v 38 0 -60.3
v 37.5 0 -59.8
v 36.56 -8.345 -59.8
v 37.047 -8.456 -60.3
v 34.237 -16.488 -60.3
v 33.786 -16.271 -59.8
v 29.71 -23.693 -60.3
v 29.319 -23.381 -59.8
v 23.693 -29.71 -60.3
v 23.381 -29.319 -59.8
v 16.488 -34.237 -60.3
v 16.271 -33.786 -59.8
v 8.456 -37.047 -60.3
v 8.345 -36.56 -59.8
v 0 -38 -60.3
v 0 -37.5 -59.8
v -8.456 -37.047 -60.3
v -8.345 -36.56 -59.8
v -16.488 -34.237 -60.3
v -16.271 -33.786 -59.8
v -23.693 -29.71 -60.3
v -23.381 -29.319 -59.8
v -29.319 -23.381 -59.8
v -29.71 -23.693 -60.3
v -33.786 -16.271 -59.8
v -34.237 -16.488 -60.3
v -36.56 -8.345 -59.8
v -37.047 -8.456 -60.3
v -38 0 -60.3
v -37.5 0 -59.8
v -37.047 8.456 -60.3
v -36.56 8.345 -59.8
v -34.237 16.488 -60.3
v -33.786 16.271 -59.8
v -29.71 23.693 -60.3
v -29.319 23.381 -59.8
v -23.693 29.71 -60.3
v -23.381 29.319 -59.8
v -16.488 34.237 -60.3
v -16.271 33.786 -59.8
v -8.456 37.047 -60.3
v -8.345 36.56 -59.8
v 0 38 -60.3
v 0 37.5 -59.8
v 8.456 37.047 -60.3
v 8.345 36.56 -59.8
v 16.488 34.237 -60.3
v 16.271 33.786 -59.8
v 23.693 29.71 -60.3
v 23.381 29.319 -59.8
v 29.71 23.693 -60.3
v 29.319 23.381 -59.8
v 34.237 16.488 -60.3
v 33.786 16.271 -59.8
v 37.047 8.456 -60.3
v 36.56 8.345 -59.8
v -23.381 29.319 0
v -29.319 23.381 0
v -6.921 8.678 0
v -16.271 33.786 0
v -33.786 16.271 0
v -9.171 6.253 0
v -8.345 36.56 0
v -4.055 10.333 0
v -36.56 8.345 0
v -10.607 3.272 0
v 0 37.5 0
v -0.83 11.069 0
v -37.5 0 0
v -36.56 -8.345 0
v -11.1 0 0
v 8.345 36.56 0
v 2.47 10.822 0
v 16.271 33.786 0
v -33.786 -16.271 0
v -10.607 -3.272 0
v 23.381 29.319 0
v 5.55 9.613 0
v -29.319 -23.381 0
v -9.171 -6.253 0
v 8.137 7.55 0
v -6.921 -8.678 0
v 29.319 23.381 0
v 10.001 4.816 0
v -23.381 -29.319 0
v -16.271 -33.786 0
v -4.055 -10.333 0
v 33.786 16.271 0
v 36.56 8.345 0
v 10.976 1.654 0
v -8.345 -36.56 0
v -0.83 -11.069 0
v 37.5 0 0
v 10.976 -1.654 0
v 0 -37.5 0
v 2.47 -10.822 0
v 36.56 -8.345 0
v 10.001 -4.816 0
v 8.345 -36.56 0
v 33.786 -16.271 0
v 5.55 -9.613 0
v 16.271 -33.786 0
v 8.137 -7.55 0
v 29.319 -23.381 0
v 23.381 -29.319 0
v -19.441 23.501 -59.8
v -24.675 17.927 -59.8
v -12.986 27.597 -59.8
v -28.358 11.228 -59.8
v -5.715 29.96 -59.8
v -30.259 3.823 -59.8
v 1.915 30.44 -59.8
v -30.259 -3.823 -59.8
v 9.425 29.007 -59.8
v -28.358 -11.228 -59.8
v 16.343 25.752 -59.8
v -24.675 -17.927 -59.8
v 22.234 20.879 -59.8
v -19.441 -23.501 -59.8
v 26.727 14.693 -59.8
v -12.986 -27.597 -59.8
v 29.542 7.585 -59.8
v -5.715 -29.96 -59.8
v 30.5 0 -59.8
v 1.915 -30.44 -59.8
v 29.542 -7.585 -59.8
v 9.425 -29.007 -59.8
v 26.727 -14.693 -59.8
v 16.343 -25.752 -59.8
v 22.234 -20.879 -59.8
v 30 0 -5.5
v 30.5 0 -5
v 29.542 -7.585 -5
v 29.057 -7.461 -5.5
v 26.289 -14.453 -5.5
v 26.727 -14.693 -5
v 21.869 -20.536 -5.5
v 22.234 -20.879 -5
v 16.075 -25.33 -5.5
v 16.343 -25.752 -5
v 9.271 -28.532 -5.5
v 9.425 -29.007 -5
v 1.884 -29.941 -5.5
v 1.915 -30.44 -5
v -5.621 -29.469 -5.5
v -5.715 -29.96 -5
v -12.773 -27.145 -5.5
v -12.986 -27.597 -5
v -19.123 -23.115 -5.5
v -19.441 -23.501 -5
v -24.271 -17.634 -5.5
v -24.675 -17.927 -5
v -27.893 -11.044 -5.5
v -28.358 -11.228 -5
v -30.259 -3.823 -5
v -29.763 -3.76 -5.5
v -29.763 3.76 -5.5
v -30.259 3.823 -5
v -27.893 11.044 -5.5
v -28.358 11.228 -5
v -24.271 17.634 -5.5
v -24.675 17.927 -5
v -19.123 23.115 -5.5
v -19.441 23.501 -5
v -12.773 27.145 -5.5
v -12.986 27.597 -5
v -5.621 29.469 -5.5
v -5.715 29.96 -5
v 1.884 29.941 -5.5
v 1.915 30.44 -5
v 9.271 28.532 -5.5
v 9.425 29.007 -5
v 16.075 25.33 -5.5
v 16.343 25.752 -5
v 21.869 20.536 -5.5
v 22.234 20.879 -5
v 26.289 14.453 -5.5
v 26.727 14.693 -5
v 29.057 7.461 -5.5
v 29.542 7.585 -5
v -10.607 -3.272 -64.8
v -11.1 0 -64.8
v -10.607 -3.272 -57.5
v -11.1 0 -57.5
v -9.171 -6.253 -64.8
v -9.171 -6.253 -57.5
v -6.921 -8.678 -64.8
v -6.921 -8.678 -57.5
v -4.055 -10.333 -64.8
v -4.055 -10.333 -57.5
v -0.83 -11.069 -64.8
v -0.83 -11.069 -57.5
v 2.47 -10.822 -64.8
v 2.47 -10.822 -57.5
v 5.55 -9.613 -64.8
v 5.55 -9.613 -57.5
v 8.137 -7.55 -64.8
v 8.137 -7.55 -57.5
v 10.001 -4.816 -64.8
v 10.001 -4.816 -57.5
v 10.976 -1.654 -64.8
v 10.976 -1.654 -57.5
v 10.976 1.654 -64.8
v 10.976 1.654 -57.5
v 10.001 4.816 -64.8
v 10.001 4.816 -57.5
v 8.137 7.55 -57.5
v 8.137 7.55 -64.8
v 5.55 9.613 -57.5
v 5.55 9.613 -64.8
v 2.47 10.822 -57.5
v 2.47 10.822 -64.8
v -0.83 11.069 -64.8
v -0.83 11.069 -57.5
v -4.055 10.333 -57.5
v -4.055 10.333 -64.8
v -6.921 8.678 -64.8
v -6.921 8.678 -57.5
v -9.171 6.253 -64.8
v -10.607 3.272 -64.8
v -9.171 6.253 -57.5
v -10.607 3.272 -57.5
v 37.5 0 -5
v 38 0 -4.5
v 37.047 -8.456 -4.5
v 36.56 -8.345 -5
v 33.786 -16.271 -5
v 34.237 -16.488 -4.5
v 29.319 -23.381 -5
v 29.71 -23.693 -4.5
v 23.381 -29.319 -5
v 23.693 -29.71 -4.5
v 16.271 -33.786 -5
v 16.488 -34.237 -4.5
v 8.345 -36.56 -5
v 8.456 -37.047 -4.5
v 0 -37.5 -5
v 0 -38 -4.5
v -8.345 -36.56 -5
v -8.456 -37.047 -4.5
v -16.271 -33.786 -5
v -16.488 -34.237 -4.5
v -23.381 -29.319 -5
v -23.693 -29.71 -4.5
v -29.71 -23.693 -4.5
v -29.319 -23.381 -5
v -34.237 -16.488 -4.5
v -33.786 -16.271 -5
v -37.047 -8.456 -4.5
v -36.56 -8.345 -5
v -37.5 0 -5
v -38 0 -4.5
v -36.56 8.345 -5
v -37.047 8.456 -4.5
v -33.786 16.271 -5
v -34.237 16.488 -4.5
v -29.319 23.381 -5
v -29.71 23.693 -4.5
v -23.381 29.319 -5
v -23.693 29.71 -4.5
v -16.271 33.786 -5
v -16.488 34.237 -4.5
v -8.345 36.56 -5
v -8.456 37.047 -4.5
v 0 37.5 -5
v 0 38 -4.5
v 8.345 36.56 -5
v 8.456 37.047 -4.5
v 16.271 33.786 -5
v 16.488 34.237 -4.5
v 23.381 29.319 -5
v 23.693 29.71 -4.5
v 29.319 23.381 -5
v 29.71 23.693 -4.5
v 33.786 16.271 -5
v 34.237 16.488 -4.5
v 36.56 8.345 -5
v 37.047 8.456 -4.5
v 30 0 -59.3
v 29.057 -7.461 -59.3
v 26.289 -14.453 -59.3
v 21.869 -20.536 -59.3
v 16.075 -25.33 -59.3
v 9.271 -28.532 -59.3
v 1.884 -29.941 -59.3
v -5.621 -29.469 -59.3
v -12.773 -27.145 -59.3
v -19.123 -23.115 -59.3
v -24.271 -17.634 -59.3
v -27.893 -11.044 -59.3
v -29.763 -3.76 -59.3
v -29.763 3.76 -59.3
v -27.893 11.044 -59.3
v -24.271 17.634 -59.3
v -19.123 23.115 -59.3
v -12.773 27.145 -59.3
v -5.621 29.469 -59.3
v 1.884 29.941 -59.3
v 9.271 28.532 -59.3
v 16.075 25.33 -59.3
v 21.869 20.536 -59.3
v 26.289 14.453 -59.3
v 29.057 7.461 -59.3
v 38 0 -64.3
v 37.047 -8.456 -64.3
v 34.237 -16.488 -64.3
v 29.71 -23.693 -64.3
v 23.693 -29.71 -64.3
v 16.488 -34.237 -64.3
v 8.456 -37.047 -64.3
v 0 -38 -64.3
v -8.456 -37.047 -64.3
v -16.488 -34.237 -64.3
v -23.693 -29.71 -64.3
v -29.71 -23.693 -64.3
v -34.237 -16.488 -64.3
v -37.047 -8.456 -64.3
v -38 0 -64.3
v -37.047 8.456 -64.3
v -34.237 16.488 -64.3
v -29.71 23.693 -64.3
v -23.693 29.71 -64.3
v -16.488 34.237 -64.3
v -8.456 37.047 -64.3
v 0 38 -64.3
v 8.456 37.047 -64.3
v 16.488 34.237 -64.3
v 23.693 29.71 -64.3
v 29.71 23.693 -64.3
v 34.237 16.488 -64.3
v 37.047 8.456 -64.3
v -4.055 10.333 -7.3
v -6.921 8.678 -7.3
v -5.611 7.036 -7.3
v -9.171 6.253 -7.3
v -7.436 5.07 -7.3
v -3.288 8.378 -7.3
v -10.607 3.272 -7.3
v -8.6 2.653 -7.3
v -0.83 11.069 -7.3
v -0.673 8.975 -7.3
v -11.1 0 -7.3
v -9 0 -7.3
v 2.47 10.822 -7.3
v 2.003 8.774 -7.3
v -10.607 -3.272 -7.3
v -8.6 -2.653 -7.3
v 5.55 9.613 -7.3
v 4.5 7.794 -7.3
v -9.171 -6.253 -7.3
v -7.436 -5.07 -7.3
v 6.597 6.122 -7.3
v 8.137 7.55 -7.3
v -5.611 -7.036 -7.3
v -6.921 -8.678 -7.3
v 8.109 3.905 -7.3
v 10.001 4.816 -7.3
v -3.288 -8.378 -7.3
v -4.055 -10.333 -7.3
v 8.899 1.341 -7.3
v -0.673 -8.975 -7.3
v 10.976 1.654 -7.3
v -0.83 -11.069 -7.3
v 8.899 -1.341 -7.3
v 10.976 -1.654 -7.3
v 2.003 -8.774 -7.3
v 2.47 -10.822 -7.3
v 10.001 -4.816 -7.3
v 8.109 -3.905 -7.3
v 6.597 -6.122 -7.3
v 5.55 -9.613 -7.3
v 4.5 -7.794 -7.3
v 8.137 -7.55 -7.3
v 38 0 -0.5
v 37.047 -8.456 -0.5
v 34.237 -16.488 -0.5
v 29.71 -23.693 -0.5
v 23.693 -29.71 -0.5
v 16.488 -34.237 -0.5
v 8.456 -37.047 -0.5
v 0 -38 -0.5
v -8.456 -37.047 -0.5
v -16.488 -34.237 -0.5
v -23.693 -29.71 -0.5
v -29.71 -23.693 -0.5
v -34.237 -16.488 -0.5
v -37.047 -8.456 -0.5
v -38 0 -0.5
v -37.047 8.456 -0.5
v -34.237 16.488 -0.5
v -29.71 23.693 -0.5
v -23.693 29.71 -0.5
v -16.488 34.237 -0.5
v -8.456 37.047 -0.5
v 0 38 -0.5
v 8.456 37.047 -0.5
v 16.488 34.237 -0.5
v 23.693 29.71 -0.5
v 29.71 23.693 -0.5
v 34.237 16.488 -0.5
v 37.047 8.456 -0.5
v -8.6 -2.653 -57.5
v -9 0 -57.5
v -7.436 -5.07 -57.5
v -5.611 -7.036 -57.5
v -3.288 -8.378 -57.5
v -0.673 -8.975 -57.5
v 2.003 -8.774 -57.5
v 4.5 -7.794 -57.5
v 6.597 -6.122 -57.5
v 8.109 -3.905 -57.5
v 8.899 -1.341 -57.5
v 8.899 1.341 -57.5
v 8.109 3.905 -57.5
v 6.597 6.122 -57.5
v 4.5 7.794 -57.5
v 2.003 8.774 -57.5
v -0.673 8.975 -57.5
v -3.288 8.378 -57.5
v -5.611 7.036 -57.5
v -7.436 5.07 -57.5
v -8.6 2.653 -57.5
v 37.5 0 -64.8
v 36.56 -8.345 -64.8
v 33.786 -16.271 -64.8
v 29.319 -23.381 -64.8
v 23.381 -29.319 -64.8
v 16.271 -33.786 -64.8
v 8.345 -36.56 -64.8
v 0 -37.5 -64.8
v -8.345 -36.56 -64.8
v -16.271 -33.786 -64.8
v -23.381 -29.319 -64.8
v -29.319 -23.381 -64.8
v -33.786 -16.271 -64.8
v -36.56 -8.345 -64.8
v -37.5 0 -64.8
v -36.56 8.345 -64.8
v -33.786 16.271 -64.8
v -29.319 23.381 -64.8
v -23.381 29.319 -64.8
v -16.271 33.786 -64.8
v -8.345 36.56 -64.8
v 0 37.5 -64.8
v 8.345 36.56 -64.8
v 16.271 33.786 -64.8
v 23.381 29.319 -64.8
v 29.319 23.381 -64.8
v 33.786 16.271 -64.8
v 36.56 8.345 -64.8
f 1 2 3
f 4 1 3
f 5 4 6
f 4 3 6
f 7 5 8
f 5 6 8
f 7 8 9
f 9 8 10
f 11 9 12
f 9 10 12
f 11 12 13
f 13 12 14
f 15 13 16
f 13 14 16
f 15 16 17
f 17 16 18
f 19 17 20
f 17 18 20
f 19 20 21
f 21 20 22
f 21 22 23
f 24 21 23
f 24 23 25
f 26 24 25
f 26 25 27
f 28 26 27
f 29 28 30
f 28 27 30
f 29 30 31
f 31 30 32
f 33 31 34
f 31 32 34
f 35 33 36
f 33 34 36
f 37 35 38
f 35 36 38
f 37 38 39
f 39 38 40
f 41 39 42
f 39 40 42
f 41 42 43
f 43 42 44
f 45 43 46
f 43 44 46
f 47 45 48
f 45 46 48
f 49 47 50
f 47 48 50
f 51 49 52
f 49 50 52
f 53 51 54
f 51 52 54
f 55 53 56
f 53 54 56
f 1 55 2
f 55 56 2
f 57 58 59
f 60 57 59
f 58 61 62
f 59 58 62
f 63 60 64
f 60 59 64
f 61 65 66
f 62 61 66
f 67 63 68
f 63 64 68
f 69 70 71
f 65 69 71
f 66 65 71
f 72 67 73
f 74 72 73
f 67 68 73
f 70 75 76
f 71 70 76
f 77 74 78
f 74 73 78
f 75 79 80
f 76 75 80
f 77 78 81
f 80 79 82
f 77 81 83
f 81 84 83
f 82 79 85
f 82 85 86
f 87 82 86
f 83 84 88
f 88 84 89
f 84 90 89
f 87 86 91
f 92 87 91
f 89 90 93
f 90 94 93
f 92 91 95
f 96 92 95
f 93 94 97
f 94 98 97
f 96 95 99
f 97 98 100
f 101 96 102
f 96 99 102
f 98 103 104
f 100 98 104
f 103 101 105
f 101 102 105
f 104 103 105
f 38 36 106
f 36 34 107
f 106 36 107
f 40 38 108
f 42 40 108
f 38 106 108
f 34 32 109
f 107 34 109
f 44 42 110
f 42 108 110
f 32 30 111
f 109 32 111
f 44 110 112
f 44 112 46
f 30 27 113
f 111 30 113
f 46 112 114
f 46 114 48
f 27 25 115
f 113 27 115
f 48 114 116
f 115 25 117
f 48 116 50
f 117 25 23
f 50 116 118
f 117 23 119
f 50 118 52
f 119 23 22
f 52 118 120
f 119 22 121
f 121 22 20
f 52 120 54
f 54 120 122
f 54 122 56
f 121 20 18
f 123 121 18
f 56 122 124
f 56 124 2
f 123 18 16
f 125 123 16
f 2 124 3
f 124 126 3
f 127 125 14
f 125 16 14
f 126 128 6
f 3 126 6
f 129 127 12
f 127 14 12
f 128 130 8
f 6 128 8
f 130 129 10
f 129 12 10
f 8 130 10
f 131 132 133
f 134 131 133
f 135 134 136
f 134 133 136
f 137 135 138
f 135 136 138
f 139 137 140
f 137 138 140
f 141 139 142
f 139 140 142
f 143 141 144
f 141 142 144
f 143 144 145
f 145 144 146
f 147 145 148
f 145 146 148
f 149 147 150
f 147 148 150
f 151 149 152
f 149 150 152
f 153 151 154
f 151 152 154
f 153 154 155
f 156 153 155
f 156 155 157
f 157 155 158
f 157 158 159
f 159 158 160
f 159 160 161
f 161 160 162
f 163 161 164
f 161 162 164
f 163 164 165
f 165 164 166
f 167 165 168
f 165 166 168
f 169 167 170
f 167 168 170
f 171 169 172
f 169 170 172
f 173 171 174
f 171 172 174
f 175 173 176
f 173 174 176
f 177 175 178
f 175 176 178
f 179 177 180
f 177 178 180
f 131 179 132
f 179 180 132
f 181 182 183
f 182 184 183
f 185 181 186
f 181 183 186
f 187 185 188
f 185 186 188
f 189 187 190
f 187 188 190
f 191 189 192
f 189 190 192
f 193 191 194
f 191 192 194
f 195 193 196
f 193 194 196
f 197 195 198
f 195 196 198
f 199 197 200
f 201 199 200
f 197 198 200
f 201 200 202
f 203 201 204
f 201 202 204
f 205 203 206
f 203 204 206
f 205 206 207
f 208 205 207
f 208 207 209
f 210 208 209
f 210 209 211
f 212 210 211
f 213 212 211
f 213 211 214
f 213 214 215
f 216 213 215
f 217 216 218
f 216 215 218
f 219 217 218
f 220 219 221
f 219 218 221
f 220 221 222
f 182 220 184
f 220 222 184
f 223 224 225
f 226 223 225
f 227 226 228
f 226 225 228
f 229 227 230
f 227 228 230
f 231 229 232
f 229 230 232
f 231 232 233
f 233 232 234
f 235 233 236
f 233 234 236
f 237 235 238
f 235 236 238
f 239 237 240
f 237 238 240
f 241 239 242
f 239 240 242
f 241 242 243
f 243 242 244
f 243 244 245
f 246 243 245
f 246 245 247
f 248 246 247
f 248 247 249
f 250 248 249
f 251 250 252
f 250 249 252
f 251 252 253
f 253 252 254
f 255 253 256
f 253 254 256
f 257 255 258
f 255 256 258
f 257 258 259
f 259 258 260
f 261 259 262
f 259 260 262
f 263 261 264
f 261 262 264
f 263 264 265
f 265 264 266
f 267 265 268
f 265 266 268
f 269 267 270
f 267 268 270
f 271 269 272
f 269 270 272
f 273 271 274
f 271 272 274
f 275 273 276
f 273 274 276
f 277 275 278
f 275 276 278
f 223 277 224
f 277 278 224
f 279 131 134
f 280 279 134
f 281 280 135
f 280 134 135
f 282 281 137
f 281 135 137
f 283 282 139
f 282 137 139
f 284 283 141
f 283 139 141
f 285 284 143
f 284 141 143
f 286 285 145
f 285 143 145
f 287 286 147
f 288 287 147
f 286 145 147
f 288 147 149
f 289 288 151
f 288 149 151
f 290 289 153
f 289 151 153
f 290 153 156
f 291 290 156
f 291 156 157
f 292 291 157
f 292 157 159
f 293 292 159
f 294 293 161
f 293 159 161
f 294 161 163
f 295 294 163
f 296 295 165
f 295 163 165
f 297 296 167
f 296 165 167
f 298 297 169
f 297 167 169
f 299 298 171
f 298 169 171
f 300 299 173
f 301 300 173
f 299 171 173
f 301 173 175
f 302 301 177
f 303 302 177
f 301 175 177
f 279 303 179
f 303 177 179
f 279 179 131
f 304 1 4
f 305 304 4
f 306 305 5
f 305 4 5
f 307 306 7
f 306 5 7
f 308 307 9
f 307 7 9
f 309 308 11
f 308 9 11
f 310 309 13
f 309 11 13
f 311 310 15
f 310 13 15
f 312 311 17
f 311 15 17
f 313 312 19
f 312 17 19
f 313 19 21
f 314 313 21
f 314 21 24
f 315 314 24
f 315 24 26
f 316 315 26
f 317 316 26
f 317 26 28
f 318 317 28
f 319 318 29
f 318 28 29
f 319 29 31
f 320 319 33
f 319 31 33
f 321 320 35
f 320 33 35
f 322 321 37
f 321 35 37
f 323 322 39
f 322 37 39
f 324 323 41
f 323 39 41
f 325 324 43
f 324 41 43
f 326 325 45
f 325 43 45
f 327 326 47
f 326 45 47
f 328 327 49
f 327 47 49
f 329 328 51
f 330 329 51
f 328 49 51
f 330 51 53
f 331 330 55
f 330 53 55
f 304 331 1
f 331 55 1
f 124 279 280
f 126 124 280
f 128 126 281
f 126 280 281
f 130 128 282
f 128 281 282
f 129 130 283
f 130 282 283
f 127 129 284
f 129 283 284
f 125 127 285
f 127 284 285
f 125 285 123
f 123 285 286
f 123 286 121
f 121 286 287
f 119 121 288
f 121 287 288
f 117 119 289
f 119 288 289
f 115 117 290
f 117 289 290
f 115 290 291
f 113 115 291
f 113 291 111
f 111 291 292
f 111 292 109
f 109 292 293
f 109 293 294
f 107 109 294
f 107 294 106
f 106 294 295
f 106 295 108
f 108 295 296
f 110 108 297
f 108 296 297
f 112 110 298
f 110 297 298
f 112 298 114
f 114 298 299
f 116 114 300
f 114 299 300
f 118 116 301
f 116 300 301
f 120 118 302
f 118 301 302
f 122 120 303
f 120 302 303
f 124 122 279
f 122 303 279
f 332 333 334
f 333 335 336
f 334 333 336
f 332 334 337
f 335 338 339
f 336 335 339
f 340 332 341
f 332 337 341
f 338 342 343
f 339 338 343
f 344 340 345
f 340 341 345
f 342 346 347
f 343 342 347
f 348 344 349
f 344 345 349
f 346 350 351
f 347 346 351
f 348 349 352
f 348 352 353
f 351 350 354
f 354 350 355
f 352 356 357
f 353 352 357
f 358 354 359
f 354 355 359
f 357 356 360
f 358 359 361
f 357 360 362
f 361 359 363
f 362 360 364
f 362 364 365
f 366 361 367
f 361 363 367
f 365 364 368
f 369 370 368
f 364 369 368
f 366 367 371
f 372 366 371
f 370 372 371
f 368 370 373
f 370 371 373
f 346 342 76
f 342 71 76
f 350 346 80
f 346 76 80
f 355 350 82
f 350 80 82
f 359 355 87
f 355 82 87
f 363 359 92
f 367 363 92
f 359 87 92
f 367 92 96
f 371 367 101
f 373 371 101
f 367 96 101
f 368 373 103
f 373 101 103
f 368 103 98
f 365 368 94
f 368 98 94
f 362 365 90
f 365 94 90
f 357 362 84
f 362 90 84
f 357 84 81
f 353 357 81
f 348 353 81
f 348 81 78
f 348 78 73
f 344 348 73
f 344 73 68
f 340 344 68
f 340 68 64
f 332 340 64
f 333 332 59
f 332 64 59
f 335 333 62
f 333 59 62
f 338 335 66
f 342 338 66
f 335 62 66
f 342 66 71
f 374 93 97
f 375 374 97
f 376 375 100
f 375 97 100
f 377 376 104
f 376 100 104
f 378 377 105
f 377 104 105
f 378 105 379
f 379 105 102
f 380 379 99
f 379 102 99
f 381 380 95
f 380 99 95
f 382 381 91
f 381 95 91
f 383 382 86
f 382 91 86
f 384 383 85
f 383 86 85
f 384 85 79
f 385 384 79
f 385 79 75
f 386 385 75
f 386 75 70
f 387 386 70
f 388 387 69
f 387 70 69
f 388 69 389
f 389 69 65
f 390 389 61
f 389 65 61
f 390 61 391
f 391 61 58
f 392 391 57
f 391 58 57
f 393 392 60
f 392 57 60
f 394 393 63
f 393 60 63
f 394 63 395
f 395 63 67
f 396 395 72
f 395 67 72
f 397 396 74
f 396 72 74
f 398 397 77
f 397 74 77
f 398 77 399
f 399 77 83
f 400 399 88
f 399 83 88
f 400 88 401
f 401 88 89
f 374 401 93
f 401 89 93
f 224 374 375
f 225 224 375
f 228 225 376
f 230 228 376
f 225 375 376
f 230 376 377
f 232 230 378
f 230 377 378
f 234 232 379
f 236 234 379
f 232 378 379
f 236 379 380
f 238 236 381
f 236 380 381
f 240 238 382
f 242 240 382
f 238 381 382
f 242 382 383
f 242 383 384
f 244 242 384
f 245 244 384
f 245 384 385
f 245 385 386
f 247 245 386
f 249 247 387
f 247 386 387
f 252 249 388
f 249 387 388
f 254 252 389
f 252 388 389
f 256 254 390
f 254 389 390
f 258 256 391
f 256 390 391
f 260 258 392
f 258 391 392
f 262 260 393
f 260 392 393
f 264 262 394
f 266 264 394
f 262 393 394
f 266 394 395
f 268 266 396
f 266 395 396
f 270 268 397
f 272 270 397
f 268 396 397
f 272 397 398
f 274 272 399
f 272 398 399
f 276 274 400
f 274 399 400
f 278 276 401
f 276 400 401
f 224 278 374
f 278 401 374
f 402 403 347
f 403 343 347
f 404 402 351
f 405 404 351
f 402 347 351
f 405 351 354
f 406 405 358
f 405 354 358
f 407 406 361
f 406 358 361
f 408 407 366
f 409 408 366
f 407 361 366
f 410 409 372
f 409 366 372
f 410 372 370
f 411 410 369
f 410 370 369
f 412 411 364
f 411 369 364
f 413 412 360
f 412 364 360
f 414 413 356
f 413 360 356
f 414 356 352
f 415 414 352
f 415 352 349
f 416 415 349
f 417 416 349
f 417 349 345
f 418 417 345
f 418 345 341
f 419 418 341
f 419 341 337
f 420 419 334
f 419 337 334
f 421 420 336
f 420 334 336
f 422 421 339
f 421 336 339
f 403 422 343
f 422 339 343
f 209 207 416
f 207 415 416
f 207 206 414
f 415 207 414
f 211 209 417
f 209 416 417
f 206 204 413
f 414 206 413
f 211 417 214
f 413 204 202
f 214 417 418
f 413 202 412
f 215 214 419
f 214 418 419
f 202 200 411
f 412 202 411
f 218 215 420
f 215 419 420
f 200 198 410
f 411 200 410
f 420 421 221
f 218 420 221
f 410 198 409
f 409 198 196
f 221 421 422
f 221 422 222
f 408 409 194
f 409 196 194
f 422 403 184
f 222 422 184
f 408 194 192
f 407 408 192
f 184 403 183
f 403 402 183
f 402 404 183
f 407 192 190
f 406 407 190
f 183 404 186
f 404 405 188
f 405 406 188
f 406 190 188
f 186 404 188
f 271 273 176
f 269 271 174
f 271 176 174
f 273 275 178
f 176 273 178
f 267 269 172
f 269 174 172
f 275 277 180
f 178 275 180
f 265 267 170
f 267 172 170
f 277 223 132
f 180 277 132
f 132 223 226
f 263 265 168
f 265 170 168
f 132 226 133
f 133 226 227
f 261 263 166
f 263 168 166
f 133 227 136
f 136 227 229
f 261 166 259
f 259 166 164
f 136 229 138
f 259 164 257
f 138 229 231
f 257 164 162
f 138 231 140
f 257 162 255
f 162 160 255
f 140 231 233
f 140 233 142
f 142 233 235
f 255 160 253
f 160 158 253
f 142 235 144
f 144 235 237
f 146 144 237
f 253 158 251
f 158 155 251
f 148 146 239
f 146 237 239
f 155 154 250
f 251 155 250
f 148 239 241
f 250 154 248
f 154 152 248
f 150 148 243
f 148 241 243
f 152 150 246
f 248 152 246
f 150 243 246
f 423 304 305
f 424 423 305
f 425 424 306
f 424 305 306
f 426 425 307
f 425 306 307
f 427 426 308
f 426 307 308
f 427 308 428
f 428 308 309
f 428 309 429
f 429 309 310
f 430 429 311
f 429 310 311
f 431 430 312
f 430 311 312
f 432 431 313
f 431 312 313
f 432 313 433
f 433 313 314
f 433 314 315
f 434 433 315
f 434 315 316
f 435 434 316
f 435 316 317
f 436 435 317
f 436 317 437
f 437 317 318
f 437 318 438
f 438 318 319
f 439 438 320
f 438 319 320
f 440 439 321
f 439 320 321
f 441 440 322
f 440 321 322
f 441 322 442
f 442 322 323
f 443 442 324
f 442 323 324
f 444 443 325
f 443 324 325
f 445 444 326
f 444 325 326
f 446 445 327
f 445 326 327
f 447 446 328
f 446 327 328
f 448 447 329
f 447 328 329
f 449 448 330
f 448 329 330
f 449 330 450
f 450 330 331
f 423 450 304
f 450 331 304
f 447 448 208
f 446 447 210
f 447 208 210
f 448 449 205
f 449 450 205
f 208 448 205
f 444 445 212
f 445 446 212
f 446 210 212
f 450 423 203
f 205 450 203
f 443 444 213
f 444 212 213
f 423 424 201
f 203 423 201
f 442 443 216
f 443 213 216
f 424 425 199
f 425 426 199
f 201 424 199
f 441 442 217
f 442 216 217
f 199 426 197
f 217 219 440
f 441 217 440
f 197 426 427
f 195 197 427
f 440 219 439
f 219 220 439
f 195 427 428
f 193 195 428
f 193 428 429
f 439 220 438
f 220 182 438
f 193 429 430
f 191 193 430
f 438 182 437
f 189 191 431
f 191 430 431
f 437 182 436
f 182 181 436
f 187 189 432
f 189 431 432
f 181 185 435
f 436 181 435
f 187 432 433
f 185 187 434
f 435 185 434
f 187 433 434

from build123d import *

# Parameters (mm, degrees)
CHAMFER1_SIZE = 0.5


with BuildPart() as part:
    # Sketch1 → Revolve1 (revolve)
    with BuildSketch(Plane(origin=(0, 0, 0), x_dir=(1, 0, 0), z_dir=(0, 1, 0)), mode=Mode.PRIVATE) as revolve1_sk:
        Polygon((0, 0), (0, 64.8), (-38, 64.8), (-38, 59.8), (-30, 59.8), (-30, 5), (-38, 5), (-38, 0), align=None)
    revolve(revolve1_sk.sketch.rotate(Axis((0, 0, 0), (0, 0, -1)), 180), axis=Axis((0, 0, 0), (0, 0, -1)))

    # Sketch7 → Cut-Revolve1 (revolve, cut)
    with BuildSketch(Plane(origin=(0, 0, 0), x_dir=(1, 0, 0), z_dir=(0, 1, 0))):
        Polygon((0, 64.8), (-11.1, 64.8), (-11.1, 57.5), (-9, 57.5), (-9, 7.3), (-11.1, 7.3), (-11.1, 0), (0, 0), align=None)
    revolve(axis=Axis((0, 0, -64.8), (0, 0, 1)), mode=Mode.SUBTRACT)

    # Chamfer1
    chamfer1_edges = [part.edges().sort_by_distance(p)[0] for p in [
        (-38, 0, 0),
        (-38, 0, -5),
        (-30, 0, -5),
        (-30, 0, -59.8),
        (-38, 0, -59.8),
        (-38, 0, -64.8),
    ]]
    chamfer(chamfer1_edges, length=CHAMFER1_SIZE)


solid = part.part
